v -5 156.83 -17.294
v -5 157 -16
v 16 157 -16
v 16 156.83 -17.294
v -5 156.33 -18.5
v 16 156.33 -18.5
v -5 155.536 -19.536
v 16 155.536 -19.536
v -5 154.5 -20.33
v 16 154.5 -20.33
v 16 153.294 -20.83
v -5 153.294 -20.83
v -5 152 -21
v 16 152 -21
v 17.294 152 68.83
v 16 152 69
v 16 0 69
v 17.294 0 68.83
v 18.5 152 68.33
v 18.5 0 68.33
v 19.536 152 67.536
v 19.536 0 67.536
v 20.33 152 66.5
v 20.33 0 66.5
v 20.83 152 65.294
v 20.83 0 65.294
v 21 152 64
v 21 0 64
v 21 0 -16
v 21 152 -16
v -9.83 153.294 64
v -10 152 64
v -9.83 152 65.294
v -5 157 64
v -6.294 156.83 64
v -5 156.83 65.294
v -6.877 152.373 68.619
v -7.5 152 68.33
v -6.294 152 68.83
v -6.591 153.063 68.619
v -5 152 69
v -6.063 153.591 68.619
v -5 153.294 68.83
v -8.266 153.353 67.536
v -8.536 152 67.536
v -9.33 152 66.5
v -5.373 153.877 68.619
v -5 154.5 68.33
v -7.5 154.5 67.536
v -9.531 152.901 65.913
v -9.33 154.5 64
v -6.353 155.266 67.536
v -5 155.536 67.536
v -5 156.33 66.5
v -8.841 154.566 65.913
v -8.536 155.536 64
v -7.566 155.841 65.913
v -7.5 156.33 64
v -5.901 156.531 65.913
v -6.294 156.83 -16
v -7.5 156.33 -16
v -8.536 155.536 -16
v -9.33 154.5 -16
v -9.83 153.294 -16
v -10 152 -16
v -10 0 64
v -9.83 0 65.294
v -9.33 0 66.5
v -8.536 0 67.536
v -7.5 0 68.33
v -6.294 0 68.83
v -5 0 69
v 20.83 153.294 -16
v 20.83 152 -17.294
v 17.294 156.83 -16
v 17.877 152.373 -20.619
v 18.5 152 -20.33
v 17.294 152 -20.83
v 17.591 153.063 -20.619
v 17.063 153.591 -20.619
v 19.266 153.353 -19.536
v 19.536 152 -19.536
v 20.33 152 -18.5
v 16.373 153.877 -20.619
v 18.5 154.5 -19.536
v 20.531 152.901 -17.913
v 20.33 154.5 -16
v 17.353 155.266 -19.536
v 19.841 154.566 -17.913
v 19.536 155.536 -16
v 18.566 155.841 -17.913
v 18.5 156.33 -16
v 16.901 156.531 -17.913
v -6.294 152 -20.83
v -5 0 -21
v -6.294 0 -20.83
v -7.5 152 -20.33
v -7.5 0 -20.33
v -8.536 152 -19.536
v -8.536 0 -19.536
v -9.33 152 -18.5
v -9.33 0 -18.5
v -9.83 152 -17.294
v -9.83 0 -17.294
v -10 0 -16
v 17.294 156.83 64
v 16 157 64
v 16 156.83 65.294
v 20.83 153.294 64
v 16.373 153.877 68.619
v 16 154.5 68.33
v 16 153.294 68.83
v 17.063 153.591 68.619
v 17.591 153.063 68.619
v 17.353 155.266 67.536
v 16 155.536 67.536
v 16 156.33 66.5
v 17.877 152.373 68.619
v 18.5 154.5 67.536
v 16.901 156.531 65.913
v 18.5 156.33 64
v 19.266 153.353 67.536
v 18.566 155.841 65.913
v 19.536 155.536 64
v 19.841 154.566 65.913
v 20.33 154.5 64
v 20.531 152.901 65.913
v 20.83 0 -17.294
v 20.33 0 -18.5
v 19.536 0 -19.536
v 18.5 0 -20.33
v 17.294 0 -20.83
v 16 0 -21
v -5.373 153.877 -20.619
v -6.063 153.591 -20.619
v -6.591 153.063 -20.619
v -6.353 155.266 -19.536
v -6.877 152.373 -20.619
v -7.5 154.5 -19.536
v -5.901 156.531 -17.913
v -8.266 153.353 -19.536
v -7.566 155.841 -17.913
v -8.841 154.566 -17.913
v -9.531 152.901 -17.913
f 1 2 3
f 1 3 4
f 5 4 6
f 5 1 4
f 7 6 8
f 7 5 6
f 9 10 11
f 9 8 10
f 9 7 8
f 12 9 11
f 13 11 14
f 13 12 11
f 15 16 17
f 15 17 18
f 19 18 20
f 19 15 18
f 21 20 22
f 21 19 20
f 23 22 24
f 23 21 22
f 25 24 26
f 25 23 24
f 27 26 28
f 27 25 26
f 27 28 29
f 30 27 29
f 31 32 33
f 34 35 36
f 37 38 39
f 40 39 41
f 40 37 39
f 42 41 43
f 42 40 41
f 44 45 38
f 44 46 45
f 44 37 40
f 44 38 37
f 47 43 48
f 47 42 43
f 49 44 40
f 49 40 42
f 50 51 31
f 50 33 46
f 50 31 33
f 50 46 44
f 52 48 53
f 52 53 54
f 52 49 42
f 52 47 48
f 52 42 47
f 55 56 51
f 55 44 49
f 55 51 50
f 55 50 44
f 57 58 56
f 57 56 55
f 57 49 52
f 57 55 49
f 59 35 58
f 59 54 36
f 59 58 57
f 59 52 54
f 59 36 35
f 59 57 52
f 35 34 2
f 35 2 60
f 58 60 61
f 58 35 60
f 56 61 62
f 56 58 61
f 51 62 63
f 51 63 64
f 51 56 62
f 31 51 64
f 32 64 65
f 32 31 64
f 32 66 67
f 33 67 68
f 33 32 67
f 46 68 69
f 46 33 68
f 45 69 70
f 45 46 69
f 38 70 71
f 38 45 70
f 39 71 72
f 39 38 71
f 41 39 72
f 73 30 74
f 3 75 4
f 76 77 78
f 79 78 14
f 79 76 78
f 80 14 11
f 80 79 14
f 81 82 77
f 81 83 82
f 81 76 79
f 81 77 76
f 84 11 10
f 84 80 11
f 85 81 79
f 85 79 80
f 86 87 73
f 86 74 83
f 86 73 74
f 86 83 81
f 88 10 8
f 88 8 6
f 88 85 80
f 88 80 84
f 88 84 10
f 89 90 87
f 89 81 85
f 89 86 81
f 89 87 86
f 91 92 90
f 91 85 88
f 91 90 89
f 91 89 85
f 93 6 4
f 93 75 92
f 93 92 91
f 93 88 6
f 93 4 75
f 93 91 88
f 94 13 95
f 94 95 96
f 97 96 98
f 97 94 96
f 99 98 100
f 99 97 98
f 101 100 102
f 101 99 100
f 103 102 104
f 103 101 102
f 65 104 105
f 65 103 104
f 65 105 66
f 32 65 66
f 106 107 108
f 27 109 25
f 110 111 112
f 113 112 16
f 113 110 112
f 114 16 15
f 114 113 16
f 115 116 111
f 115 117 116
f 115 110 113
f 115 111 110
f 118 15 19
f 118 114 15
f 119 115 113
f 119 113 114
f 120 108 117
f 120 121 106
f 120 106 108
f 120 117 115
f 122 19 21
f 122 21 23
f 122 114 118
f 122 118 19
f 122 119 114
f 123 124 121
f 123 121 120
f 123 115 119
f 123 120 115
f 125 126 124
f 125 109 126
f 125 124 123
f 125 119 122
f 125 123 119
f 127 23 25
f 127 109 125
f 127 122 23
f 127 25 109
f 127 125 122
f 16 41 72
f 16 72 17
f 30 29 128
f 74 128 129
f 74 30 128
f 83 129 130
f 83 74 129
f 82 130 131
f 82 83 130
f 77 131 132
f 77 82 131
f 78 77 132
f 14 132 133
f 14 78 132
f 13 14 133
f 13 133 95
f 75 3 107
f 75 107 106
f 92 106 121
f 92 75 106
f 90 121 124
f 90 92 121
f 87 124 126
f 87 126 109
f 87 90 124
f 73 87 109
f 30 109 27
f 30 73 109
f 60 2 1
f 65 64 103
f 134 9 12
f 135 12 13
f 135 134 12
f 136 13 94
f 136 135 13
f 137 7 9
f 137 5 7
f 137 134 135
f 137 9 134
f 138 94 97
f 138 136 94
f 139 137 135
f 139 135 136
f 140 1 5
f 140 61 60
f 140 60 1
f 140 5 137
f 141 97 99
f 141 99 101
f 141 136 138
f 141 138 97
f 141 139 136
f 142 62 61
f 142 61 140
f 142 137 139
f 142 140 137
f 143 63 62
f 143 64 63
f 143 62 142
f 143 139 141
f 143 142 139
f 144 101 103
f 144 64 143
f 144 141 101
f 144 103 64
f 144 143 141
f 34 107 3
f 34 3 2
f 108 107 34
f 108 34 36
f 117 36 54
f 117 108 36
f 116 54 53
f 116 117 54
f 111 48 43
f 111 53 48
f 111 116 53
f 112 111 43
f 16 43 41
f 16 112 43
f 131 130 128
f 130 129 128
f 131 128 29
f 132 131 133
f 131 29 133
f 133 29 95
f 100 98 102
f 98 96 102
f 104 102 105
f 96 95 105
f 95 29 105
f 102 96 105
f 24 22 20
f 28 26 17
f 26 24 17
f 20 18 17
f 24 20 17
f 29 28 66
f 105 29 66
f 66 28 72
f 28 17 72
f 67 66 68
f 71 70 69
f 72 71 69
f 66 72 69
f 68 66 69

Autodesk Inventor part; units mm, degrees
ref_plane "YZ Plane" through (0, 0, 0) normal (1, 0, 0) x (0, 1, 0)
ref_plane "XZ Plane" through (0, 0, 0) normal (0, 1, 0) x (-1, 0, 0)
ref_plane "XY Plane" through (0, 0, 0) normal (0, 0, 1) x (1, 0, 0)
sketch "Esquisse1" plane through (0, 0, 0) normal (0, 1, 0) x (-1, 0, 0)
  line L0 (10, 69) -> (-21, 69)
  line L1 (-21, 69) -> (-21, -21)
  line L2 (-21, -21) -> (10, -21)
  line L3 (10, -21) -> (10, 69)
  point P0 (0, 0)
  dimension "d0" = 90
  dimension "d1" = 31
extrude "Extrusion1" add sketch "Esquisse1" along normal blind 157
fillet "Congé1" radius 5 8 edges at (21, 157, 24) (-10, 157, 24) (5.5, 157, 69) (5.5, 157, -21) (21, 78.5, -21) (-10, 78.5, -21) (-10, 78.5, 69) (21, 78.5, 69)
properties part number "batt"
